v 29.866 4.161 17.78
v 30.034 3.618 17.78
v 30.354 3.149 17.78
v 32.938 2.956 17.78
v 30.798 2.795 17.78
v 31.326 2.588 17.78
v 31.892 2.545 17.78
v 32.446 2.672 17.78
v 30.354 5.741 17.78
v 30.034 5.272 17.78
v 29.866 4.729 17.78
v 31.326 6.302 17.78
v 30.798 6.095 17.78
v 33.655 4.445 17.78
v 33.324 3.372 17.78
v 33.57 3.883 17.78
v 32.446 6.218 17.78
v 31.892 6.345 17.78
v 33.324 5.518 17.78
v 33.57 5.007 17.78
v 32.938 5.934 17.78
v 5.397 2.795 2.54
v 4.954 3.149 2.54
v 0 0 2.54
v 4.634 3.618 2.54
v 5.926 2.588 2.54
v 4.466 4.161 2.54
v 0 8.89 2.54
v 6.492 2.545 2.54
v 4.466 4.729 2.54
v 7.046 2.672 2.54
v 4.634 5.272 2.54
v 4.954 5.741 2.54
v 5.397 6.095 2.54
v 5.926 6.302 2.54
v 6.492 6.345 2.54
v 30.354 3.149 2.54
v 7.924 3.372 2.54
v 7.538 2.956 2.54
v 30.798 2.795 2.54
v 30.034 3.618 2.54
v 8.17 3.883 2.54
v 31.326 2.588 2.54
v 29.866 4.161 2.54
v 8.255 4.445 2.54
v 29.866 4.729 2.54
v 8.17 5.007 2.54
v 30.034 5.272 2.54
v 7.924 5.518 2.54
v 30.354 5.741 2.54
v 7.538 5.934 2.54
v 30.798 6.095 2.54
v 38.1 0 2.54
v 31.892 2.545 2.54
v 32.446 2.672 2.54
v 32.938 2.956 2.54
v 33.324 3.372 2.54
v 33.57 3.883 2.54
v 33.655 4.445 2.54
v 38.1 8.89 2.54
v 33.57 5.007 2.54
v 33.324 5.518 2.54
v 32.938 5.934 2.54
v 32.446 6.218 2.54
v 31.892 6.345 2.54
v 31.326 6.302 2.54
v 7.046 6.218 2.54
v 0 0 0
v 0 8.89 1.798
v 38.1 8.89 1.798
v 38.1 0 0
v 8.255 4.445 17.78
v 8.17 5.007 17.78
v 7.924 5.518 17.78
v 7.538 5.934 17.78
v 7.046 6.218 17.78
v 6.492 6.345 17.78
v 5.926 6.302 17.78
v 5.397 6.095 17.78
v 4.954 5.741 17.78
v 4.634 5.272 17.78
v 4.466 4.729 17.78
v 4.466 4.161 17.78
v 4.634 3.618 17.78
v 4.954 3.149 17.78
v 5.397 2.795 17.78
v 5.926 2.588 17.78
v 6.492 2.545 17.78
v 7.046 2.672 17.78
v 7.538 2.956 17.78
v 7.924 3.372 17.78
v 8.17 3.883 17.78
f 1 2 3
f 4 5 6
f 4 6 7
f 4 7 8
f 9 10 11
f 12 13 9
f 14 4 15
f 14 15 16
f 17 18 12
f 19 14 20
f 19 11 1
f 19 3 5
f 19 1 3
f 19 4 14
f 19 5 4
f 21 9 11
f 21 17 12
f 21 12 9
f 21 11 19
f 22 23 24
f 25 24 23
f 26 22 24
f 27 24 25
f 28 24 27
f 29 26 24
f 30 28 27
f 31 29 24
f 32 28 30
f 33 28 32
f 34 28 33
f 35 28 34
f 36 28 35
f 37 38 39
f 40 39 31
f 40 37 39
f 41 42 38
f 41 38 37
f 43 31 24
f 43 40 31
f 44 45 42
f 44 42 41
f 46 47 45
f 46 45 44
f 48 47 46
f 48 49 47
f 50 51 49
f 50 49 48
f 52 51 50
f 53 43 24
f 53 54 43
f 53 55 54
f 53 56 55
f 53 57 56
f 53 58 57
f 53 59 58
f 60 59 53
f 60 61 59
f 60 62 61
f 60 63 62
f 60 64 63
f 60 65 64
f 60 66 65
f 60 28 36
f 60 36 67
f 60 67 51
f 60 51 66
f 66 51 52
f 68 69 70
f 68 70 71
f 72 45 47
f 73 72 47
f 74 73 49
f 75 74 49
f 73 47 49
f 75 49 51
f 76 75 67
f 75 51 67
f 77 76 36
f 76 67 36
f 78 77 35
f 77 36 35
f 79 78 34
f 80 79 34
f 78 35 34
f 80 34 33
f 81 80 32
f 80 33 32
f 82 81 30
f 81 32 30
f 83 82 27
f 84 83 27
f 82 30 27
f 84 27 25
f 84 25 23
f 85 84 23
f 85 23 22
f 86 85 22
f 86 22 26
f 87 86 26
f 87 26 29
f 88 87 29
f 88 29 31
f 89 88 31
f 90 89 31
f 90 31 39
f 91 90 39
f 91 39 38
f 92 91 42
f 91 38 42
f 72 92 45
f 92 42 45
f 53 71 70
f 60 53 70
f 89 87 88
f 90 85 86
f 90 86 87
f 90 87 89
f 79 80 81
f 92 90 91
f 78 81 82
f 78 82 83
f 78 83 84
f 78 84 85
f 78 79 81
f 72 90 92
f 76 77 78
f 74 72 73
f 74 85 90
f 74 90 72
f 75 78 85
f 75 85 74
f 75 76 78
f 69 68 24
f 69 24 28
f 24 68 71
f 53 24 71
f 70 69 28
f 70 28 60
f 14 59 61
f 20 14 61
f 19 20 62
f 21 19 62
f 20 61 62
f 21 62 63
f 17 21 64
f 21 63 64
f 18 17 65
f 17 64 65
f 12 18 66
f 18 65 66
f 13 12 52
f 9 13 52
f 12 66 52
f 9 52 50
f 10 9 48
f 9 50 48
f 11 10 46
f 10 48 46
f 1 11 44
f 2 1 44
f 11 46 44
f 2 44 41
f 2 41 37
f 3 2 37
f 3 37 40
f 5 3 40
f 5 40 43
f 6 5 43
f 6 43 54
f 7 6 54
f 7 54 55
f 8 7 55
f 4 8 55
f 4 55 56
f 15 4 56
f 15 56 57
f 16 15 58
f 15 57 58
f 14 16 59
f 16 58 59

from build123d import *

# Parameters (mm, degrees)
F0_W     = 38.1
F0_H     = 8.89
F1_DEPTH = 2.54
F2_R     = 1.905
F3_DEPTH = 15.24
F5_DEPTH = 38.1


with BuildPart() as f1:
    # F0 (on Top) → F1 (new body)
    with BuildSketch(Plane.XY):
        with Locations((19.05, 4.445)):
            Rectangle(F0_W, F0_H)
    extrude(amount=F1_DEPTH)

    # F2 (on face) → F3 (join)
    with BuildSketch(Plane.XY.offset(2.54)):
        with Locations((6.35, 4.445)):
            Circle(F2_R)
        with Locations((31.75, 4.445)):
            Circle(F2_R)
    extrude(amount=F3_DEPTH)

    # F4 (on face) → F5 (cut)
    with BuildSketch(Plane.YZ.offset(38.1)):
        Polygon((8.89, 0), (8.89, 1.798025), (0, 0), align=None)
    extrude(amount=-F5_DEPTH, mode=Mode.SUBTRACT)


solid = f1.part
